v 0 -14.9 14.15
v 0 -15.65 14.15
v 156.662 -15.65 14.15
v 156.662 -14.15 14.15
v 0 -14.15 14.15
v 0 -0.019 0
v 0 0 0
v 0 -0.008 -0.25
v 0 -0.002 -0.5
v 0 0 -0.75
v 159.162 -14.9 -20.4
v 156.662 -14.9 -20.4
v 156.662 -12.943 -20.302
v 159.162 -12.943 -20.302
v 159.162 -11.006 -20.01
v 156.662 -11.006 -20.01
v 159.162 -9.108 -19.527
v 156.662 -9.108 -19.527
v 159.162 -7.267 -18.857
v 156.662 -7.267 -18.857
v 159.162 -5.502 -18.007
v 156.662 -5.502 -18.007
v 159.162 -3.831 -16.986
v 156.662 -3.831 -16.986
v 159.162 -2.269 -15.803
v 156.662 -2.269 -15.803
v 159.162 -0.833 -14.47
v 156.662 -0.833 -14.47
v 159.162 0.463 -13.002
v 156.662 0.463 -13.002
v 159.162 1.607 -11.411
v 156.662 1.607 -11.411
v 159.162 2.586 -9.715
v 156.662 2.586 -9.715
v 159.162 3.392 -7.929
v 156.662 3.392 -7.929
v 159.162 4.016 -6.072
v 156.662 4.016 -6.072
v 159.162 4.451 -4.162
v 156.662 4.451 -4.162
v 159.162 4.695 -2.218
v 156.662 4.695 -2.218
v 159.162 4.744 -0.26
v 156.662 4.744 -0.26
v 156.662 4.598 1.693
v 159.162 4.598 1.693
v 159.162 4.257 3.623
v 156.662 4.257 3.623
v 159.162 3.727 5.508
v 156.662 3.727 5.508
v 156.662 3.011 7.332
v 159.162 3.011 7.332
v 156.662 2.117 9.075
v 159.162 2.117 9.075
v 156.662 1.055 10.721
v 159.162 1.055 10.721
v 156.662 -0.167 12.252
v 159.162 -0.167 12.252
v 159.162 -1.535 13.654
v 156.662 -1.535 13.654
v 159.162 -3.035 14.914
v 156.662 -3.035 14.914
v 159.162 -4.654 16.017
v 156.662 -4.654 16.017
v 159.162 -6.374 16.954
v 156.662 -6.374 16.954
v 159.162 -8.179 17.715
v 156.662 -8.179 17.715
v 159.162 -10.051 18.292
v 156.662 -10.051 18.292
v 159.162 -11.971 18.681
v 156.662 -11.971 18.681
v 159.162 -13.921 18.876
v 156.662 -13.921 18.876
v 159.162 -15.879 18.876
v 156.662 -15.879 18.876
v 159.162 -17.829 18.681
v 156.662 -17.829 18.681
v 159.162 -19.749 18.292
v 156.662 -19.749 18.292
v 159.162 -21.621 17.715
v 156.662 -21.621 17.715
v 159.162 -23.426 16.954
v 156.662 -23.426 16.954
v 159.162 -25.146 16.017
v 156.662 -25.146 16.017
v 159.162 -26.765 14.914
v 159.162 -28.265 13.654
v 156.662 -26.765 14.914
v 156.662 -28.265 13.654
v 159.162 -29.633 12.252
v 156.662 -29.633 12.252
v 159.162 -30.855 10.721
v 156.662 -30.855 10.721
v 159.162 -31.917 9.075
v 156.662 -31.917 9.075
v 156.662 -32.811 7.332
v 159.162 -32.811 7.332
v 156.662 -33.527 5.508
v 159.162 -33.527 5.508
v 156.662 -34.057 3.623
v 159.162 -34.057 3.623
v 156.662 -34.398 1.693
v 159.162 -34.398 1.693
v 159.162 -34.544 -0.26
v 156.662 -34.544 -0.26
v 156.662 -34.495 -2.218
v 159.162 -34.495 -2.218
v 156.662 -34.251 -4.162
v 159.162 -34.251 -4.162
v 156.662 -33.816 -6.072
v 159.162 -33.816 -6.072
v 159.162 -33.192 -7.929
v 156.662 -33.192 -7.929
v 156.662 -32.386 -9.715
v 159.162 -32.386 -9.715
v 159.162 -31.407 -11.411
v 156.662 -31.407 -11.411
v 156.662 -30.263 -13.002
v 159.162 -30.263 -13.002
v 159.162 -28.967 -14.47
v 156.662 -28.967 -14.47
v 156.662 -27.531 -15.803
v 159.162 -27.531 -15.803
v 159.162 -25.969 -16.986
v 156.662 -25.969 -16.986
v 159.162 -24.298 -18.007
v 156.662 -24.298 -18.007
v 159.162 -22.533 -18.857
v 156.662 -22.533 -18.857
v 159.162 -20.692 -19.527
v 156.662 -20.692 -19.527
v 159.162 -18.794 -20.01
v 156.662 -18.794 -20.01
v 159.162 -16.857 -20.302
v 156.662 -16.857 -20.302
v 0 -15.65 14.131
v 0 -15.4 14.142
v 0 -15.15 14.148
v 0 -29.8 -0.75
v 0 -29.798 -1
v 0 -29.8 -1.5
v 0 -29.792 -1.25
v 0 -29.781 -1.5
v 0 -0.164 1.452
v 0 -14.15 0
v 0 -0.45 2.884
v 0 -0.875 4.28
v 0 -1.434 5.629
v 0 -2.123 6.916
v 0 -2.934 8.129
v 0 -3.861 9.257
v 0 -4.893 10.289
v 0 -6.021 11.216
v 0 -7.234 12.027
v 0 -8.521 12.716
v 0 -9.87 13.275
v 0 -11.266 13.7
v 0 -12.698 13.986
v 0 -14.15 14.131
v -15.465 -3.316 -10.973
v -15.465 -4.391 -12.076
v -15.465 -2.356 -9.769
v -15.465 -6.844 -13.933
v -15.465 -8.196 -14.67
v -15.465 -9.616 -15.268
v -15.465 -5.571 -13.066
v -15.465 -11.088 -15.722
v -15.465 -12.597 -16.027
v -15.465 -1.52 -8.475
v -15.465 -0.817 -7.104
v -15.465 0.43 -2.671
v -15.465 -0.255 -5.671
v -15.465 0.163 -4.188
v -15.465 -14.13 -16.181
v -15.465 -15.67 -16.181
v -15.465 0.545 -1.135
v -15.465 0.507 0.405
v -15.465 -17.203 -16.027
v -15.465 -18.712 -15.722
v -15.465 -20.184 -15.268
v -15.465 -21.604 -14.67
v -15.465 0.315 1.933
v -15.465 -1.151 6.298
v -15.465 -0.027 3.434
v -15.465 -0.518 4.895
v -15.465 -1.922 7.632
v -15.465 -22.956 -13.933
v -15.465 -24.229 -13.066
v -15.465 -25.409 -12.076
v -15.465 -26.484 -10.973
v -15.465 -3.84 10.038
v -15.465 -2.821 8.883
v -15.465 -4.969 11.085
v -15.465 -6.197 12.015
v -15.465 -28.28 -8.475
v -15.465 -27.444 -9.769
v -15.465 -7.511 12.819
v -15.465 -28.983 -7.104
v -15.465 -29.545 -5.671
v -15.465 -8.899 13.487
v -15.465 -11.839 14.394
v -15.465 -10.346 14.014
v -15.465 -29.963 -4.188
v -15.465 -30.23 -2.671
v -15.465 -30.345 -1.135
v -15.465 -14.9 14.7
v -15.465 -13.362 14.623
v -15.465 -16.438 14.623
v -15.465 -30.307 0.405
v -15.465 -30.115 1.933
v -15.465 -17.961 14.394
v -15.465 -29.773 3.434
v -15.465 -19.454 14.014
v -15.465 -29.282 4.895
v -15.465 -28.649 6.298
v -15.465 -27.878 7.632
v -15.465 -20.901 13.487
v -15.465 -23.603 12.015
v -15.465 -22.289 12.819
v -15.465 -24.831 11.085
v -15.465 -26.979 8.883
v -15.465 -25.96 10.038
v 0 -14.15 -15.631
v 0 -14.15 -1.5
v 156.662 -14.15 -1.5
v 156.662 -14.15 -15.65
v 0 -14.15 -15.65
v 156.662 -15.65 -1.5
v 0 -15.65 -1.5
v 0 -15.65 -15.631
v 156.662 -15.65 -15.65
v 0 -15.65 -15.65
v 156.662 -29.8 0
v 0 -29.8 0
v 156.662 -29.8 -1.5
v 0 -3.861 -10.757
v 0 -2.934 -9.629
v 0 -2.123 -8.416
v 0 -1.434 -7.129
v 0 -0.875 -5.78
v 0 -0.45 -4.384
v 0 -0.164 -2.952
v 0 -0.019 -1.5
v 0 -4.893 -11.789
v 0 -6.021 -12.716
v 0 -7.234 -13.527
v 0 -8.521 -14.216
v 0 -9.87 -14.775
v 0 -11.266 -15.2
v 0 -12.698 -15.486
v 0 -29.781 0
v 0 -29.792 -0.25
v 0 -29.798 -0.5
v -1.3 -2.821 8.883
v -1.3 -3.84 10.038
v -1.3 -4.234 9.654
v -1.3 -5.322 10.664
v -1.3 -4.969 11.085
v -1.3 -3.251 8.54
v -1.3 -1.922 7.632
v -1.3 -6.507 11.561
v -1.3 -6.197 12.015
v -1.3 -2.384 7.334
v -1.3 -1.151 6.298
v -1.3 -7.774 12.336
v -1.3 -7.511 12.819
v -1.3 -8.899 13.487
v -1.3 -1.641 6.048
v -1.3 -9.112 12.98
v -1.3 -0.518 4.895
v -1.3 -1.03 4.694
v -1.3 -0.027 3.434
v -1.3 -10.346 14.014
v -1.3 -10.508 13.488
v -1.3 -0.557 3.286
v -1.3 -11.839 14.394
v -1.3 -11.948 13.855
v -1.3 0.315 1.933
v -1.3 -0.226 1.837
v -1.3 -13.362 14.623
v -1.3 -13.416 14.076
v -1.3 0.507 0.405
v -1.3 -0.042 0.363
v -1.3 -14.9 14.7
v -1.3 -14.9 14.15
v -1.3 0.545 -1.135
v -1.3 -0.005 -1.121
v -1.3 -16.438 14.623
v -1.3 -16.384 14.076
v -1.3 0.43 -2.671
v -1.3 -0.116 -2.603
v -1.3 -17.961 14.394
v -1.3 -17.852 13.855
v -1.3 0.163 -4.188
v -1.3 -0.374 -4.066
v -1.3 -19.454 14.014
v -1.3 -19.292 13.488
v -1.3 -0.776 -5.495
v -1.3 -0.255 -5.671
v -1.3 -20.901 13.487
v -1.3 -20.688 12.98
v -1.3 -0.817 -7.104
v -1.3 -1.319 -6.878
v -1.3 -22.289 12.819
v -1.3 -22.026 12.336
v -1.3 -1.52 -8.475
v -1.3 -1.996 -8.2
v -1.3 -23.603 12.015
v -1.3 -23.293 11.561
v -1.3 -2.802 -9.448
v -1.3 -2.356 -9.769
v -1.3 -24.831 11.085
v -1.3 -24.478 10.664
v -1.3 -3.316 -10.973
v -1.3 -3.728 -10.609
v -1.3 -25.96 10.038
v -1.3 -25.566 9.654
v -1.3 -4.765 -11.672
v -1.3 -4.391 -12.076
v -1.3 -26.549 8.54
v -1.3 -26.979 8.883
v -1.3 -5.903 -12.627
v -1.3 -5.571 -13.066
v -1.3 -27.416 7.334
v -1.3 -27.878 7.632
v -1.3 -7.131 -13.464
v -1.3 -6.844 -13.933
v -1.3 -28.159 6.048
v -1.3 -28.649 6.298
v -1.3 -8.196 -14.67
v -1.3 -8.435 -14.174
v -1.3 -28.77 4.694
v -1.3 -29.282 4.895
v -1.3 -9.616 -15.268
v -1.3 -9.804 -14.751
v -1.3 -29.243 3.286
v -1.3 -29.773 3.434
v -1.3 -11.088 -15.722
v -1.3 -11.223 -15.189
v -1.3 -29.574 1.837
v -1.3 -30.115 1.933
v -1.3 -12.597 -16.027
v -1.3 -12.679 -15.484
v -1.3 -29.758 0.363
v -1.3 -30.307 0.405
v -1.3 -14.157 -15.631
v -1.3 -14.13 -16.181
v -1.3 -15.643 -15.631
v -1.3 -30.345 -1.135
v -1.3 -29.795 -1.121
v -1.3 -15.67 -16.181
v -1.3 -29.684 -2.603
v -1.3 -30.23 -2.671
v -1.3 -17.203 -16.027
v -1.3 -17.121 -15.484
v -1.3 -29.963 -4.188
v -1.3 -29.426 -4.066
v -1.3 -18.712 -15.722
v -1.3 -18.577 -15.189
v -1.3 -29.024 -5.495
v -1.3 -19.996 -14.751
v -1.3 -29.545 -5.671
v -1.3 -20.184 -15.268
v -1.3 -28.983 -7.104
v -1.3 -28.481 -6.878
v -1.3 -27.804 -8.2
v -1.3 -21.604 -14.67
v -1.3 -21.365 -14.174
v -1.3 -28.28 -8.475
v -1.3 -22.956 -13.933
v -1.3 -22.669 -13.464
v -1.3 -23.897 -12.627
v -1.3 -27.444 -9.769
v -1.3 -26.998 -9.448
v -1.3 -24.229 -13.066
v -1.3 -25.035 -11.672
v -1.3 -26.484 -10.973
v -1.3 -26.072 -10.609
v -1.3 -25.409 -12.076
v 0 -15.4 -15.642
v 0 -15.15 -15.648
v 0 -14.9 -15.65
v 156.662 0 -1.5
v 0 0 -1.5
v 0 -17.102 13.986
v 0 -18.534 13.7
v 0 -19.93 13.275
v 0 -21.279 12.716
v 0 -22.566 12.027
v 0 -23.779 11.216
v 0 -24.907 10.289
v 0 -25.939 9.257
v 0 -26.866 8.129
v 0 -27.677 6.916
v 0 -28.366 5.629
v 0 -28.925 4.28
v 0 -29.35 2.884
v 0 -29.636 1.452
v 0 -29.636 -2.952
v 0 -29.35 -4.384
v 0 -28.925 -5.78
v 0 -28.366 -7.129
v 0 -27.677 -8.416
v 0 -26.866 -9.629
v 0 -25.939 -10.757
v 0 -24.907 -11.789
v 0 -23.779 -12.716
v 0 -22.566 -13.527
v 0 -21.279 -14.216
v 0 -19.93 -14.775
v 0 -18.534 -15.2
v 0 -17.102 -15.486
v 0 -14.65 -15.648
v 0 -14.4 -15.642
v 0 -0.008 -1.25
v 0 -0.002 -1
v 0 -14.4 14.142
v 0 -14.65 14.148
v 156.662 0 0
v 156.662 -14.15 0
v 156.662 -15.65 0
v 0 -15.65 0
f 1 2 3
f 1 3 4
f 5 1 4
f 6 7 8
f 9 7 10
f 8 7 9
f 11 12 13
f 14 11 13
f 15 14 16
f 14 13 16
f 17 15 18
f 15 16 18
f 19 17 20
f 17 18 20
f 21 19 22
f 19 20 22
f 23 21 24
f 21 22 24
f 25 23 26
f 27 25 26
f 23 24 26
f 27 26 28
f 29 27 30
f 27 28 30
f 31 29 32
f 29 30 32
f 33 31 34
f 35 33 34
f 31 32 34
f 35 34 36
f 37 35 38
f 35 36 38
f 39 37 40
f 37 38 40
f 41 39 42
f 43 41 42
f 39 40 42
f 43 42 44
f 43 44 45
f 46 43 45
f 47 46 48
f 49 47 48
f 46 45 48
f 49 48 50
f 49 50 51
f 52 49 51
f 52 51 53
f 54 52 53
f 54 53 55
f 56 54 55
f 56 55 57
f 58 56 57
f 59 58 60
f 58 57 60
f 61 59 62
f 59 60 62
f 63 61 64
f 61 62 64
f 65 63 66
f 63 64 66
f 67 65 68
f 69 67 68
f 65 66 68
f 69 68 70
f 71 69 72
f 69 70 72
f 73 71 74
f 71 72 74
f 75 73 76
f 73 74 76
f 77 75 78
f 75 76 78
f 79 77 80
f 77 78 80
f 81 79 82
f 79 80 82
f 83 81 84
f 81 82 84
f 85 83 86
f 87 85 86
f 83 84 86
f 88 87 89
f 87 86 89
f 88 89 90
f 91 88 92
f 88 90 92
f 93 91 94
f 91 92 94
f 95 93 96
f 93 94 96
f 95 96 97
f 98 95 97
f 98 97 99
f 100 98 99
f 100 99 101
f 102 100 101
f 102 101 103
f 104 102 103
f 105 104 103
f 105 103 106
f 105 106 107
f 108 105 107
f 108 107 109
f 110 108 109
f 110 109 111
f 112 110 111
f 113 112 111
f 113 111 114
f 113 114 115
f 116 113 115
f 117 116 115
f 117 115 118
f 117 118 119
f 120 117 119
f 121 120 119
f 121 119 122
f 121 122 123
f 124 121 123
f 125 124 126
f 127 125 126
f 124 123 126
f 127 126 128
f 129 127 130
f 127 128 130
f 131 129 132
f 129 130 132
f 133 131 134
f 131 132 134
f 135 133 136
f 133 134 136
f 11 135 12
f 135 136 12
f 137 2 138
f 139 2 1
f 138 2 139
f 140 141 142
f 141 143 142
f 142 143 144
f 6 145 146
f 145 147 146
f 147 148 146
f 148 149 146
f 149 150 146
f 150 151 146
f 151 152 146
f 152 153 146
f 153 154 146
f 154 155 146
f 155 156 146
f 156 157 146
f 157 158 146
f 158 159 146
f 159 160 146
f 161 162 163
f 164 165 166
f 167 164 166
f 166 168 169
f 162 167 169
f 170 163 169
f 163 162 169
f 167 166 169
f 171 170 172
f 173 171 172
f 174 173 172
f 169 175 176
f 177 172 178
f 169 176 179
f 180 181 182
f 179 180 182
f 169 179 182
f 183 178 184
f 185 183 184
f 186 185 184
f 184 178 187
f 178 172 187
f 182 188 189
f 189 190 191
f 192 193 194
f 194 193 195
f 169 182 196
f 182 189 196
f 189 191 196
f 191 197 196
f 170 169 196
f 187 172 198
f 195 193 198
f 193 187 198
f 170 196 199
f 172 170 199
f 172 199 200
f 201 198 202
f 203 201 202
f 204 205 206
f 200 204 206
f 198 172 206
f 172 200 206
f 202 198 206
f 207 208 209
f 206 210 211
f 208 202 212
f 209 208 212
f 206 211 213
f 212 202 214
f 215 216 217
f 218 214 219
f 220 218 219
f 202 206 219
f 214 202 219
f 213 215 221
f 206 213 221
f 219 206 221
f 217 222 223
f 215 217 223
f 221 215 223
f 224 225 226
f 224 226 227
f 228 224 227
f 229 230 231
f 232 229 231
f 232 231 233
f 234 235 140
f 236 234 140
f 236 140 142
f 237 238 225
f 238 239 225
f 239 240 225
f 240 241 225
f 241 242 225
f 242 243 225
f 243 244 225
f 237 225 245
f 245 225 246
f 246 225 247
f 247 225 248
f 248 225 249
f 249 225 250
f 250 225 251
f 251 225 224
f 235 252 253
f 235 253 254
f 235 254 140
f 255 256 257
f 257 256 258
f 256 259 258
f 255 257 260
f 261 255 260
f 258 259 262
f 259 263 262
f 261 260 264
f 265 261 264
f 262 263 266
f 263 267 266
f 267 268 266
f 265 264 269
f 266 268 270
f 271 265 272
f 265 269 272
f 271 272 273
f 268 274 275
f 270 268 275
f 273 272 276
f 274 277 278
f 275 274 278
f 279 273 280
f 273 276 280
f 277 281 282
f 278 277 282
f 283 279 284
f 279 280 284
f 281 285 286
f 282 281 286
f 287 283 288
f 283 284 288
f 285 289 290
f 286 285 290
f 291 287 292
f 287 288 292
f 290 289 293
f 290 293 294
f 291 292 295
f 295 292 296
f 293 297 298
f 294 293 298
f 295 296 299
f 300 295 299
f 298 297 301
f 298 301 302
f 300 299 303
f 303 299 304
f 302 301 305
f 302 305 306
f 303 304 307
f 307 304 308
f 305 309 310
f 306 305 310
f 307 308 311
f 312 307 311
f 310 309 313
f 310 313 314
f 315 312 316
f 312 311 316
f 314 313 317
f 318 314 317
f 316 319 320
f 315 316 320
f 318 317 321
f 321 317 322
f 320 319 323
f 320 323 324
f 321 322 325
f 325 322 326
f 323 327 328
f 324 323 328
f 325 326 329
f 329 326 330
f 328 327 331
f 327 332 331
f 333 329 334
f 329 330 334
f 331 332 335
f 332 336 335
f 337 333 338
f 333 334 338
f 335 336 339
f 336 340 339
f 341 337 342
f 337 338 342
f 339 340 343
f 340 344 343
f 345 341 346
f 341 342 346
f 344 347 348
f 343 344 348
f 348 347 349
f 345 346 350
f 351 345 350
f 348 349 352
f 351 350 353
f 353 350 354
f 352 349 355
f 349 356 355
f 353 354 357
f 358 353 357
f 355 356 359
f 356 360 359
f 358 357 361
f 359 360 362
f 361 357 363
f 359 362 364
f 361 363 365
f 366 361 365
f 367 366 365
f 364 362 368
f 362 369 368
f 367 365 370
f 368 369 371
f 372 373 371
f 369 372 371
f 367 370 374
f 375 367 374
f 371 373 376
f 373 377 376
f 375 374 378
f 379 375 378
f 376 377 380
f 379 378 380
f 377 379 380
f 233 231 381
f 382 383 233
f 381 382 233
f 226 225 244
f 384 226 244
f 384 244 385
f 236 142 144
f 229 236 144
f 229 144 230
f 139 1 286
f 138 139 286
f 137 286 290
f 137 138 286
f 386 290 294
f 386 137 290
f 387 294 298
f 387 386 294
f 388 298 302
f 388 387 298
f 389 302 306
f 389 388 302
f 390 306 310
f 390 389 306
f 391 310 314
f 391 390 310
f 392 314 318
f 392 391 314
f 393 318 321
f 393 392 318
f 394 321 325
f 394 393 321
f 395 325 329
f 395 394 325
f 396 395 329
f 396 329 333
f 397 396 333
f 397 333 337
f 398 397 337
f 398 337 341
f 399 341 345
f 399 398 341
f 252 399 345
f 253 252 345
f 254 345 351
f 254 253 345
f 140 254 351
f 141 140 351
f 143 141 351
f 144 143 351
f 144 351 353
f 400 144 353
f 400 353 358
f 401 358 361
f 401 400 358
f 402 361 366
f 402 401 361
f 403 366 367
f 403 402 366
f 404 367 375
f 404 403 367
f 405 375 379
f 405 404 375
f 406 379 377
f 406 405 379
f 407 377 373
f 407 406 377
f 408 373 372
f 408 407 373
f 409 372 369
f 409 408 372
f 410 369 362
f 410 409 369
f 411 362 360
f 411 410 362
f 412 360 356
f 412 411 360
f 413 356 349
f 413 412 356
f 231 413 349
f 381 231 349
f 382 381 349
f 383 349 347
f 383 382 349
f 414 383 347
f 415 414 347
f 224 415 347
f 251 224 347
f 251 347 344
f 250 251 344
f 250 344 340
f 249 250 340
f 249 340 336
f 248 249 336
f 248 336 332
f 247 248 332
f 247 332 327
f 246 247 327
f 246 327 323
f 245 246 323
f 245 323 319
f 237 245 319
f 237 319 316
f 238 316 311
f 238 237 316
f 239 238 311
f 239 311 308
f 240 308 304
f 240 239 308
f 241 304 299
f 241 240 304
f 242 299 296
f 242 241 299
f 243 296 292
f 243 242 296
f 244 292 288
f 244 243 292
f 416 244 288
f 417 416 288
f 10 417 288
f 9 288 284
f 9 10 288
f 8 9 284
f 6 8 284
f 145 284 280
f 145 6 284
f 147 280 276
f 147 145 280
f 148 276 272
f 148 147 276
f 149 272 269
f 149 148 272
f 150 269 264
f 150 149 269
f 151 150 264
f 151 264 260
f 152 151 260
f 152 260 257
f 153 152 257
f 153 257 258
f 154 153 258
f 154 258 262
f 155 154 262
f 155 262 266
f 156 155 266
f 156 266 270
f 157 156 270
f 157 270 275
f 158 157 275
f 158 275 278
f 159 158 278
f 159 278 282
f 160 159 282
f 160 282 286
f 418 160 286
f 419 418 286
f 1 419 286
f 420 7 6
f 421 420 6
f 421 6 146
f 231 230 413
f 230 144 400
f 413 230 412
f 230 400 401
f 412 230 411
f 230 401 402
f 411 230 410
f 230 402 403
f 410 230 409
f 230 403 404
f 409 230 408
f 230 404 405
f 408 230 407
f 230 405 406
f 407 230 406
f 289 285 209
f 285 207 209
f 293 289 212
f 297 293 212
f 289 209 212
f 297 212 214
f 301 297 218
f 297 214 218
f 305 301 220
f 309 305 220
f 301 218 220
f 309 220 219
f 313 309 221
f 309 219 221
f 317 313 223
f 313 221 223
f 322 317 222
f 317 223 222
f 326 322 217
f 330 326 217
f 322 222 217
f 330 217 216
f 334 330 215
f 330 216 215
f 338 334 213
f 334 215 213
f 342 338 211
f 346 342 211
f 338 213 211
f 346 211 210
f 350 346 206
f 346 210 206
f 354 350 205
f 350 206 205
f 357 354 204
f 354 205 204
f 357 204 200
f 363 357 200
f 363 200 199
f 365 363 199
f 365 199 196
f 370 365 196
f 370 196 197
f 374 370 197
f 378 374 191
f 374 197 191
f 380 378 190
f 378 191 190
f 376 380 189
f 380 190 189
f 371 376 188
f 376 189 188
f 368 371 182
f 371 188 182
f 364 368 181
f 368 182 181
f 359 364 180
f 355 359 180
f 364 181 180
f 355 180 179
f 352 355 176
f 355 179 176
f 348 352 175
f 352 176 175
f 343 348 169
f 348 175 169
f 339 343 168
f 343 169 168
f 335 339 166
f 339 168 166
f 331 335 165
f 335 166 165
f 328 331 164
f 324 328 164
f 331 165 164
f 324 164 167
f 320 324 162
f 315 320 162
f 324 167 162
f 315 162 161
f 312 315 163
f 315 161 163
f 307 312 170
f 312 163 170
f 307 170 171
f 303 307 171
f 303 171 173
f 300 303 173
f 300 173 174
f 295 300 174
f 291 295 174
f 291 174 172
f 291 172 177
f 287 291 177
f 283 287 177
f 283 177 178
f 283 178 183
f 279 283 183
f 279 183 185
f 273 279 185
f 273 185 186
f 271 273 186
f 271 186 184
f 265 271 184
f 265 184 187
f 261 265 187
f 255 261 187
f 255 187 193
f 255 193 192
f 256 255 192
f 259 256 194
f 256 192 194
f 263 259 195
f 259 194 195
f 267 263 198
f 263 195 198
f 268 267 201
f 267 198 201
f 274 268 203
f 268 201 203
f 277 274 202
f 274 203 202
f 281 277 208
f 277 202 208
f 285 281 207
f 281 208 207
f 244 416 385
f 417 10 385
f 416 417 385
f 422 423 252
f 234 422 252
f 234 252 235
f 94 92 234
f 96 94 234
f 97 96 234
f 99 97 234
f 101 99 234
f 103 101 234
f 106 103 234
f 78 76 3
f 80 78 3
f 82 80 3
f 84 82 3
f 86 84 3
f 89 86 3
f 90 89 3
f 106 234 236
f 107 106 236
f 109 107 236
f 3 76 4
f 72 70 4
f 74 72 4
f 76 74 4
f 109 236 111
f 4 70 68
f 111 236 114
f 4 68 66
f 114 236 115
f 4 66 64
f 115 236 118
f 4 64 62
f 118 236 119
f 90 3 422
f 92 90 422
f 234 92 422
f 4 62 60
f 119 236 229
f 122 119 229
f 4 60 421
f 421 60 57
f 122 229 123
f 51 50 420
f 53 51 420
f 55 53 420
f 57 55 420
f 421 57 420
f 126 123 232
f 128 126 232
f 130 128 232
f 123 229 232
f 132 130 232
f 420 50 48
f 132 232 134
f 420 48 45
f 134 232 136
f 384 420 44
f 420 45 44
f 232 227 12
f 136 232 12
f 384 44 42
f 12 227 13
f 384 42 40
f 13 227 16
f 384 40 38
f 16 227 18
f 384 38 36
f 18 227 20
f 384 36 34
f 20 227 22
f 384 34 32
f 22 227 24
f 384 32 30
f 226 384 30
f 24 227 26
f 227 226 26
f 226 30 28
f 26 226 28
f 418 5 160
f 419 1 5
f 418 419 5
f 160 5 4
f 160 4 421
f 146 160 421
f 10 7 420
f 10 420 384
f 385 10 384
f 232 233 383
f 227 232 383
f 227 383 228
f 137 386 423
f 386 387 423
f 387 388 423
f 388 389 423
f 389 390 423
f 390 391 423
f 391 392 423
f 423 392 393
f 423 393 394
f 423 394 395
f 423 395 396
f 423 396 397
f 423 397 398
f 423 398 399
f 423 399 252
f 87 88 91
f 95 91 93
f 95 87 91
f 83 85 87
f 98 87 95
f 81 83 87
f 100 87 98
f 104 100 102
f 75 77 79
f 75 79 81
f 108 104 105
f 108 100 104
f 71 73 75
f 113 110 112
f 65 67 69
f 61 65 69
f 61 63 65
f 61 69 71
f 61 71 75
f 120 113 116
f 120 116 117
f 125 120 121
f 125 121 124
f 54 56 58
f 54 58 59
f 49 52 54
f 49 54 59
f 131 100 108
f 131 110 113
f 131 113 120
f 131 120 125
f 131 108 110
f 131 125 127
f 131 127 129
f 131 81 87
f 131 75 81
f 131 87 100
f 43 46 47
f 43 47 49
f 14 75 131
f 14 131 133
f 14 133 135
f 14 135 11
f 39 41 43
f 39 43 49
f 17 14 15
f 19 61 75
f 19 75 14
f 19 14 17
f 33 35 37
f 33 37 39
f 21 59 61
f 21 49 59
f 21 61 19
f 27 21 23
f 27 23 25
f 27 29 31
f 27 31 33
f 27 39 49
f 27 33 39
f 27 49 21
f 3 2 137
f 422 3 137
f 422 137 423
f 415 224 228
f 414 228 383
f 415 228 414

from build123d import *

# Parameters (mm, degrees)
BOSS_EXTRUDE1_DEPTH = 156.6625
SKETCH2_R           = 19.65
BOSS_EXTRUDE2_DEPTH = 2.5


with BuildPart() as part:
    # Sketch1 → Boss-Extrude1 (new body)
    with BuildSketch(Plane(origin=(0, 0, 0), x_dir=(0, 0, -1), z_dir=(1, 0, 0))):
        Polygon((1.5, 0), (0, 0), (0, -14.15), (-14.15, -14.15), (-14.15, -15.65), (0, -15.65), (0, -29.8), (1.5, -29.8), (1.5, -15.65), (15.65, -15.65), (15.65, -14.15), (1.5, -14.15), align=None)
    extrude(amount=BOSS_EXTRUDE1_DEPTH)

    # Sketch2 → Boss-Extrude2 (add)
    with BuildSketch(Plane(origin=(156.6625, 0, 0), x_dir=(0, 0, -1), z_dir=(1, 0, 0))):
        with Locations((0.75, -14.9)):
            Circle(SKETCH2_R)
    extrude(amount=BOSS_EXTRUDE2_DEPTH)

    # Sketch5 → Revolve2 (revolve)
    with BuildSketch(Plane(origin=(0, -14.9, 0), x_dir=(1, 0, 0), z_dir=(0, 1, 0))):
        Polygon((0, 15.65), (-1.3, 15.65), (-1.3, 16.2), (-15.465, 16.2), (-15.465, 0.75), (0, 0.75), align=None)
    revolve(axis=Axis((-15.465, -14.9, -0.75), (1, 0, 0)))


solid = part.part
